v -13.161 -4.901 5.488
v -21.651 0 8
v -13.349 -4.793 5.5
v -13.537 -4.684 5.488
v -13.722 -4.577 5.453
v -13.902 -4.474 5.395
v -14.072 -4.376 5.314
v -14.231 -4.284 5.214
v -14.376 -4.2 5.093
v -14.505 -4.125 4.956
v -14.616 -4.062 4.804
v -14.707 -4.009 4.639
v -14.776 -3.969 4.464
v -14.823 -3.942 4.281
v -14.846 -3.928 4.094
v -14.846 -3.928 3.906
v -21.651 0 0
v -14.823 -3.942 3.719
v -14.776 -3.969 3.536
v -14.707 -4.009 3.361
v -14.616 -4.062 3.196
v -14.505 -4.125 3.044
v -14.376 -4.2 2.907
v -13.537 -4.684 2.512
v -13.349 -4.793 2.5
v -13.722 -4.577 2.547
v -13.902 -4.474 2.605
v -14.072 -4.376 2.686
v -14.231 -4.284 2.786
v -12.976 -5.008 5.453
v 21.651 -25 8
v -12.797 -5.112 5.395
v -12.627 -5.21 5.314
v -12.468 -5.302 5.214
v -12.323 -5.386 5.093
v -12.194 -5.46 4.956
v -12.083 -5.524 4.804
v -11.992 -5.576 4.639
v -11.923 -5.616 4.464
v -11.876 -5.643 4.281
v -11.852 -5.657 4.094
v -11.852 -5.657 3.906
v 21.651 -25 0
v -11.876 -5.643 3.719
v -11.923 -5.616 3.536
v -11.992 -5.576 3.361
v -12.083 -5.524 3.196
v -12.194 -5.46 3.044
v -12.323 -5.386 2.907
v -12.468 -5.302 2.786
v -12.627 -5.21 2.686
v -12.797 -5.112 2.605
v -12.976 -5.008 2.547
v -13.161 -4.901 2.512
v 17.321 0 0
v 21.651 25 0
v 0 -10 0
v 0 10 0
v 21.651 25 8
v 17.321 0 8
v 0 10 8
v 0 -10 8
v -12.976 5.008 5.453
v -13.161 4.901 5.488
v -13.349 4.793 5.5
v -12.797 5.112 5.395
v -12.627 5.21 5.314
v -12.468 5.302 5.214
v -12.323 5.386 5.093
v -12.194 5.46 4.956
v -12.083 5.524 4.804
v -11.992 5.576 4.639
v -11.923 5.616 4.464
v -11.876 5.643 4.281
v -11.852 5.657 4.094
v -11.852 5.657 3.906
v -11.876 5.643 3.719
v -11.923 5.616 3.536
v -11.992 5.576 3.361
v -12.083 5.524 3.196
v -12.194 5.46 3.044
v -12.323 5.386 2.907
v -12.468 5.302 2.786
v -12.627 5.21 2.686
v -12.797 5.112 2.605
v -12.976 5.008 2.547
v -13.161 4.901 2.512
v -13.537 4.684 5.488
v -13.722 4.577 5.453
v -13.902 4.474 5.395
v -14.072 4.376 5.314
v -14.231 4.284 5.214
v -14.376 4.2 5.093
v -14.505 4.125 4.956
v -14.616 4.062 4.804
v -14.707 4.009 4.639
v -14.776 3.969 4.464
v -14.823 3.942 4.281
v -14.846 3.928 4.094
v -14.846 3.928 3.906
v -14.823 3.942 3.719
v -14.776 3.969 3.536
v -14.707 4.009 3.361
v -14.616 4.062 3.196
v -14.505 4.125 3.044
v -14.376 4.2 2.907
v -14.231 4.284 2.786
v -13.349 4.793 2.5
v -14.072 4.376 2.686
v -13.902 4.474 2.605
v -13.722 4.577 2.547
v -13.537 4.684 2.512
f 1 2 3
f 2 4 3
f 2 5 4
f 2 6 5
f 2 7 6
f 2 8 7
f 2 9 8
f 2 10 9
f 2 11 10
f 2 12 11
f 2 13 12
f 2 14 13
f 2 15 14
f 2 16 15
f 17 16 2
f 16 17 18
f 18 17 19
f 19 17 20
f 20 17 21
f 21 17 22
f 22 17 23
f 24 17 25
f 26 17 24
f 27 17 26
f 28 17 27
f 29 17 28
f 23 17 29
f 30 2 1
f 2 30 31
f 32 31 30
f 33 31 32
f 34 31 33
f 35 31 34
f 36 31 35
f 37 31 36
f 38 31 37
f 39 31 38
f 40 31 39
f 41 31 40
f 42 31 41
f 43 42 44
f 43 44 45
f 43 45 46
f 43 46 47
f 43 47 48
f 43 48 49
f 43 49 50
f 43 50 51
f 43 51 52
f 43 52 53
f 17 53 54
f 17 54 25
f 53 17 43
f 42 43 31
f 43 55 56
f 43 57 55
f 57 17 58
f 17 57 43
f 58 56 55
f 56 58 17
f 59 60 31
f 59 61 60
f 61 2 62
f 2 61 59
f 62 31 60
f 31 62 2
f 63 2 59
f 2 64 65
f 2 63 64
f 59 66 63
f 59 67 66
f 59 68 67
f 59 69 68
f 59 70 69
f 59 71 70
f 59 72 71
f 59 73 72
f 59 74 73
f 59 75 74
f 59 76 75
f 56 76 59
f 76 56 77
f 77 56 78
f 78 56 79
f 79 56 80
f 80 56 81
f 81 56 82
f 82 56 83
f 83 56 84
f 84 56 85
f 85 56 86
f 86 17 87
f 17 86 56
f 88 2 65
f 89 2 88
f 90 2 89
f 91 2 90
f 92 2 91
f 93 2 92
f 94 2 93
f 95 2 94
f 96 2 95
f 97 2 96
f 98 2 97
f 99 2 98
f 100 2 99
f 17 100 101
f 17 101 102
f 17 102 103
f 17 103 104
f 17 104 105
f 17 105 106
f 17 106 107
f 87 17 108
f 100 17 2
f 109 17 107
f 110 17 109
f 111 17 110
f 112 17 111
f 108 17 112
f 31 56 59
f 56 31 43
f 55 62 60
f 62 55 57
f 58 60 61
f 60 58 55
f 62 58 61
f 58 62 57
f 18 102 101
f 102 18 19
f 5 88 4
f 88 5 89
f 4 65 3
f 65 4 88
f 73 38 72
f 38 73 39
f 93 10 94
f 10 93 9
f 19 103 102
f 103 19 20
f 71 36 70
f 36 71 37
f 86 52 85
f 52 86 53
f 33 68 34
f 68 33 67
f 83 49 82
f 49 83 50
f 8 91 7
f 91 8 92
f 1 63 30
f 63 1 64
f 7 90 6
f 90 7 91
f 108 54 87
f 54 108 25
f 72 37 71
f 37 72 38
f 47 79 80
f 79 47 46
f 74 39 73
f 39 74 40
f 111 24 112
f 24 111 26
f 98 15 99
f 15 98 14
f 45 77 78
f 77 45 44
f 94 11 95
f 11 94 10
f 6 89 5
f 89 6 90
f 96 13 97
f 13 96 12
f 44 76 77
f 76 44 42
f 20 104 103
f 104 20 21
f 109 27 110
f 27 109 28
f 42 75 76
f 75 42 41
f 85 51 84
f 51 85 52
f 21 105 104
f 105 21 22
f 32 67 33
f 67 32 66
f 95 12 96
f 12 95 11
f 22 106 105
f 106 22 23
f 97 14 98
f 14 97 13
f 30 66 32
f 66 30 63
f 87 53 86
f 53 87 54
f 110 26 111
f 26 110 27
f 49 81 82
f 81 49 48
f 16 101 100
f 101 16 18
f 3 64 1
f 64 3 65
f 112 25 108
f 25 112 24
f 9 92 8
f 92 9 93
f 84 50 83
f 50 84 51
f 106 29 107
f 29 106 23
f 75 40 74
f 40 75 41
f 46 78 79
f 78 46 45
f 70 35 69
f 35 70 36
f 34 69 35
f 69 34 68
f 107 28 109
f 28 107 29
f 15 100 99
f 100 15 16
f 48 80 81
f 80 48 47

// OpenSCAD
/*
TRIFORCE  -  Legend of Zelda 
Made in Anita
*/

$fn = 50; //I only added this here (@FrankkieNL)

translate([25*sin(60),0,0])
rotate([0,-90,0])

difference(){


	polyhedron ( points = [[0,0,50*sin(60)], [8,0,50*sin(60)], [8,-25,0], [0,-25,0], [0,25,0], [8,25,0], ], 
	triangles = [[0,3,2], [0,2,1], [3,0,4], [1,2,5], [0,5,4], [0,1,5],  [5,2,4], [4,2,3], ]);


	#
	translate([12,0,25*sin(60)])
	scale([2,0.4,0.4])
	rotate([0,180,0])
	polyhedron ( points = [[0,0,50*sin(60)], [8,0,50*sin(60)], [8,-25,0], [0,-25,0], [0,25,0], [8,25,0], ], 
	triangles = [[0,3,2], [0,2,1], [3,0,4], [1,2,5], [0,5,4], [0,1,5],  [5,2,4], [4,2,3], ]);



/*  +++ A hole for use as a key ring or pendant ++++ */


	#
	translate([4,15,35])
	rotate([90,0,0])
	cylinder (h=30, r=1.5);




}
